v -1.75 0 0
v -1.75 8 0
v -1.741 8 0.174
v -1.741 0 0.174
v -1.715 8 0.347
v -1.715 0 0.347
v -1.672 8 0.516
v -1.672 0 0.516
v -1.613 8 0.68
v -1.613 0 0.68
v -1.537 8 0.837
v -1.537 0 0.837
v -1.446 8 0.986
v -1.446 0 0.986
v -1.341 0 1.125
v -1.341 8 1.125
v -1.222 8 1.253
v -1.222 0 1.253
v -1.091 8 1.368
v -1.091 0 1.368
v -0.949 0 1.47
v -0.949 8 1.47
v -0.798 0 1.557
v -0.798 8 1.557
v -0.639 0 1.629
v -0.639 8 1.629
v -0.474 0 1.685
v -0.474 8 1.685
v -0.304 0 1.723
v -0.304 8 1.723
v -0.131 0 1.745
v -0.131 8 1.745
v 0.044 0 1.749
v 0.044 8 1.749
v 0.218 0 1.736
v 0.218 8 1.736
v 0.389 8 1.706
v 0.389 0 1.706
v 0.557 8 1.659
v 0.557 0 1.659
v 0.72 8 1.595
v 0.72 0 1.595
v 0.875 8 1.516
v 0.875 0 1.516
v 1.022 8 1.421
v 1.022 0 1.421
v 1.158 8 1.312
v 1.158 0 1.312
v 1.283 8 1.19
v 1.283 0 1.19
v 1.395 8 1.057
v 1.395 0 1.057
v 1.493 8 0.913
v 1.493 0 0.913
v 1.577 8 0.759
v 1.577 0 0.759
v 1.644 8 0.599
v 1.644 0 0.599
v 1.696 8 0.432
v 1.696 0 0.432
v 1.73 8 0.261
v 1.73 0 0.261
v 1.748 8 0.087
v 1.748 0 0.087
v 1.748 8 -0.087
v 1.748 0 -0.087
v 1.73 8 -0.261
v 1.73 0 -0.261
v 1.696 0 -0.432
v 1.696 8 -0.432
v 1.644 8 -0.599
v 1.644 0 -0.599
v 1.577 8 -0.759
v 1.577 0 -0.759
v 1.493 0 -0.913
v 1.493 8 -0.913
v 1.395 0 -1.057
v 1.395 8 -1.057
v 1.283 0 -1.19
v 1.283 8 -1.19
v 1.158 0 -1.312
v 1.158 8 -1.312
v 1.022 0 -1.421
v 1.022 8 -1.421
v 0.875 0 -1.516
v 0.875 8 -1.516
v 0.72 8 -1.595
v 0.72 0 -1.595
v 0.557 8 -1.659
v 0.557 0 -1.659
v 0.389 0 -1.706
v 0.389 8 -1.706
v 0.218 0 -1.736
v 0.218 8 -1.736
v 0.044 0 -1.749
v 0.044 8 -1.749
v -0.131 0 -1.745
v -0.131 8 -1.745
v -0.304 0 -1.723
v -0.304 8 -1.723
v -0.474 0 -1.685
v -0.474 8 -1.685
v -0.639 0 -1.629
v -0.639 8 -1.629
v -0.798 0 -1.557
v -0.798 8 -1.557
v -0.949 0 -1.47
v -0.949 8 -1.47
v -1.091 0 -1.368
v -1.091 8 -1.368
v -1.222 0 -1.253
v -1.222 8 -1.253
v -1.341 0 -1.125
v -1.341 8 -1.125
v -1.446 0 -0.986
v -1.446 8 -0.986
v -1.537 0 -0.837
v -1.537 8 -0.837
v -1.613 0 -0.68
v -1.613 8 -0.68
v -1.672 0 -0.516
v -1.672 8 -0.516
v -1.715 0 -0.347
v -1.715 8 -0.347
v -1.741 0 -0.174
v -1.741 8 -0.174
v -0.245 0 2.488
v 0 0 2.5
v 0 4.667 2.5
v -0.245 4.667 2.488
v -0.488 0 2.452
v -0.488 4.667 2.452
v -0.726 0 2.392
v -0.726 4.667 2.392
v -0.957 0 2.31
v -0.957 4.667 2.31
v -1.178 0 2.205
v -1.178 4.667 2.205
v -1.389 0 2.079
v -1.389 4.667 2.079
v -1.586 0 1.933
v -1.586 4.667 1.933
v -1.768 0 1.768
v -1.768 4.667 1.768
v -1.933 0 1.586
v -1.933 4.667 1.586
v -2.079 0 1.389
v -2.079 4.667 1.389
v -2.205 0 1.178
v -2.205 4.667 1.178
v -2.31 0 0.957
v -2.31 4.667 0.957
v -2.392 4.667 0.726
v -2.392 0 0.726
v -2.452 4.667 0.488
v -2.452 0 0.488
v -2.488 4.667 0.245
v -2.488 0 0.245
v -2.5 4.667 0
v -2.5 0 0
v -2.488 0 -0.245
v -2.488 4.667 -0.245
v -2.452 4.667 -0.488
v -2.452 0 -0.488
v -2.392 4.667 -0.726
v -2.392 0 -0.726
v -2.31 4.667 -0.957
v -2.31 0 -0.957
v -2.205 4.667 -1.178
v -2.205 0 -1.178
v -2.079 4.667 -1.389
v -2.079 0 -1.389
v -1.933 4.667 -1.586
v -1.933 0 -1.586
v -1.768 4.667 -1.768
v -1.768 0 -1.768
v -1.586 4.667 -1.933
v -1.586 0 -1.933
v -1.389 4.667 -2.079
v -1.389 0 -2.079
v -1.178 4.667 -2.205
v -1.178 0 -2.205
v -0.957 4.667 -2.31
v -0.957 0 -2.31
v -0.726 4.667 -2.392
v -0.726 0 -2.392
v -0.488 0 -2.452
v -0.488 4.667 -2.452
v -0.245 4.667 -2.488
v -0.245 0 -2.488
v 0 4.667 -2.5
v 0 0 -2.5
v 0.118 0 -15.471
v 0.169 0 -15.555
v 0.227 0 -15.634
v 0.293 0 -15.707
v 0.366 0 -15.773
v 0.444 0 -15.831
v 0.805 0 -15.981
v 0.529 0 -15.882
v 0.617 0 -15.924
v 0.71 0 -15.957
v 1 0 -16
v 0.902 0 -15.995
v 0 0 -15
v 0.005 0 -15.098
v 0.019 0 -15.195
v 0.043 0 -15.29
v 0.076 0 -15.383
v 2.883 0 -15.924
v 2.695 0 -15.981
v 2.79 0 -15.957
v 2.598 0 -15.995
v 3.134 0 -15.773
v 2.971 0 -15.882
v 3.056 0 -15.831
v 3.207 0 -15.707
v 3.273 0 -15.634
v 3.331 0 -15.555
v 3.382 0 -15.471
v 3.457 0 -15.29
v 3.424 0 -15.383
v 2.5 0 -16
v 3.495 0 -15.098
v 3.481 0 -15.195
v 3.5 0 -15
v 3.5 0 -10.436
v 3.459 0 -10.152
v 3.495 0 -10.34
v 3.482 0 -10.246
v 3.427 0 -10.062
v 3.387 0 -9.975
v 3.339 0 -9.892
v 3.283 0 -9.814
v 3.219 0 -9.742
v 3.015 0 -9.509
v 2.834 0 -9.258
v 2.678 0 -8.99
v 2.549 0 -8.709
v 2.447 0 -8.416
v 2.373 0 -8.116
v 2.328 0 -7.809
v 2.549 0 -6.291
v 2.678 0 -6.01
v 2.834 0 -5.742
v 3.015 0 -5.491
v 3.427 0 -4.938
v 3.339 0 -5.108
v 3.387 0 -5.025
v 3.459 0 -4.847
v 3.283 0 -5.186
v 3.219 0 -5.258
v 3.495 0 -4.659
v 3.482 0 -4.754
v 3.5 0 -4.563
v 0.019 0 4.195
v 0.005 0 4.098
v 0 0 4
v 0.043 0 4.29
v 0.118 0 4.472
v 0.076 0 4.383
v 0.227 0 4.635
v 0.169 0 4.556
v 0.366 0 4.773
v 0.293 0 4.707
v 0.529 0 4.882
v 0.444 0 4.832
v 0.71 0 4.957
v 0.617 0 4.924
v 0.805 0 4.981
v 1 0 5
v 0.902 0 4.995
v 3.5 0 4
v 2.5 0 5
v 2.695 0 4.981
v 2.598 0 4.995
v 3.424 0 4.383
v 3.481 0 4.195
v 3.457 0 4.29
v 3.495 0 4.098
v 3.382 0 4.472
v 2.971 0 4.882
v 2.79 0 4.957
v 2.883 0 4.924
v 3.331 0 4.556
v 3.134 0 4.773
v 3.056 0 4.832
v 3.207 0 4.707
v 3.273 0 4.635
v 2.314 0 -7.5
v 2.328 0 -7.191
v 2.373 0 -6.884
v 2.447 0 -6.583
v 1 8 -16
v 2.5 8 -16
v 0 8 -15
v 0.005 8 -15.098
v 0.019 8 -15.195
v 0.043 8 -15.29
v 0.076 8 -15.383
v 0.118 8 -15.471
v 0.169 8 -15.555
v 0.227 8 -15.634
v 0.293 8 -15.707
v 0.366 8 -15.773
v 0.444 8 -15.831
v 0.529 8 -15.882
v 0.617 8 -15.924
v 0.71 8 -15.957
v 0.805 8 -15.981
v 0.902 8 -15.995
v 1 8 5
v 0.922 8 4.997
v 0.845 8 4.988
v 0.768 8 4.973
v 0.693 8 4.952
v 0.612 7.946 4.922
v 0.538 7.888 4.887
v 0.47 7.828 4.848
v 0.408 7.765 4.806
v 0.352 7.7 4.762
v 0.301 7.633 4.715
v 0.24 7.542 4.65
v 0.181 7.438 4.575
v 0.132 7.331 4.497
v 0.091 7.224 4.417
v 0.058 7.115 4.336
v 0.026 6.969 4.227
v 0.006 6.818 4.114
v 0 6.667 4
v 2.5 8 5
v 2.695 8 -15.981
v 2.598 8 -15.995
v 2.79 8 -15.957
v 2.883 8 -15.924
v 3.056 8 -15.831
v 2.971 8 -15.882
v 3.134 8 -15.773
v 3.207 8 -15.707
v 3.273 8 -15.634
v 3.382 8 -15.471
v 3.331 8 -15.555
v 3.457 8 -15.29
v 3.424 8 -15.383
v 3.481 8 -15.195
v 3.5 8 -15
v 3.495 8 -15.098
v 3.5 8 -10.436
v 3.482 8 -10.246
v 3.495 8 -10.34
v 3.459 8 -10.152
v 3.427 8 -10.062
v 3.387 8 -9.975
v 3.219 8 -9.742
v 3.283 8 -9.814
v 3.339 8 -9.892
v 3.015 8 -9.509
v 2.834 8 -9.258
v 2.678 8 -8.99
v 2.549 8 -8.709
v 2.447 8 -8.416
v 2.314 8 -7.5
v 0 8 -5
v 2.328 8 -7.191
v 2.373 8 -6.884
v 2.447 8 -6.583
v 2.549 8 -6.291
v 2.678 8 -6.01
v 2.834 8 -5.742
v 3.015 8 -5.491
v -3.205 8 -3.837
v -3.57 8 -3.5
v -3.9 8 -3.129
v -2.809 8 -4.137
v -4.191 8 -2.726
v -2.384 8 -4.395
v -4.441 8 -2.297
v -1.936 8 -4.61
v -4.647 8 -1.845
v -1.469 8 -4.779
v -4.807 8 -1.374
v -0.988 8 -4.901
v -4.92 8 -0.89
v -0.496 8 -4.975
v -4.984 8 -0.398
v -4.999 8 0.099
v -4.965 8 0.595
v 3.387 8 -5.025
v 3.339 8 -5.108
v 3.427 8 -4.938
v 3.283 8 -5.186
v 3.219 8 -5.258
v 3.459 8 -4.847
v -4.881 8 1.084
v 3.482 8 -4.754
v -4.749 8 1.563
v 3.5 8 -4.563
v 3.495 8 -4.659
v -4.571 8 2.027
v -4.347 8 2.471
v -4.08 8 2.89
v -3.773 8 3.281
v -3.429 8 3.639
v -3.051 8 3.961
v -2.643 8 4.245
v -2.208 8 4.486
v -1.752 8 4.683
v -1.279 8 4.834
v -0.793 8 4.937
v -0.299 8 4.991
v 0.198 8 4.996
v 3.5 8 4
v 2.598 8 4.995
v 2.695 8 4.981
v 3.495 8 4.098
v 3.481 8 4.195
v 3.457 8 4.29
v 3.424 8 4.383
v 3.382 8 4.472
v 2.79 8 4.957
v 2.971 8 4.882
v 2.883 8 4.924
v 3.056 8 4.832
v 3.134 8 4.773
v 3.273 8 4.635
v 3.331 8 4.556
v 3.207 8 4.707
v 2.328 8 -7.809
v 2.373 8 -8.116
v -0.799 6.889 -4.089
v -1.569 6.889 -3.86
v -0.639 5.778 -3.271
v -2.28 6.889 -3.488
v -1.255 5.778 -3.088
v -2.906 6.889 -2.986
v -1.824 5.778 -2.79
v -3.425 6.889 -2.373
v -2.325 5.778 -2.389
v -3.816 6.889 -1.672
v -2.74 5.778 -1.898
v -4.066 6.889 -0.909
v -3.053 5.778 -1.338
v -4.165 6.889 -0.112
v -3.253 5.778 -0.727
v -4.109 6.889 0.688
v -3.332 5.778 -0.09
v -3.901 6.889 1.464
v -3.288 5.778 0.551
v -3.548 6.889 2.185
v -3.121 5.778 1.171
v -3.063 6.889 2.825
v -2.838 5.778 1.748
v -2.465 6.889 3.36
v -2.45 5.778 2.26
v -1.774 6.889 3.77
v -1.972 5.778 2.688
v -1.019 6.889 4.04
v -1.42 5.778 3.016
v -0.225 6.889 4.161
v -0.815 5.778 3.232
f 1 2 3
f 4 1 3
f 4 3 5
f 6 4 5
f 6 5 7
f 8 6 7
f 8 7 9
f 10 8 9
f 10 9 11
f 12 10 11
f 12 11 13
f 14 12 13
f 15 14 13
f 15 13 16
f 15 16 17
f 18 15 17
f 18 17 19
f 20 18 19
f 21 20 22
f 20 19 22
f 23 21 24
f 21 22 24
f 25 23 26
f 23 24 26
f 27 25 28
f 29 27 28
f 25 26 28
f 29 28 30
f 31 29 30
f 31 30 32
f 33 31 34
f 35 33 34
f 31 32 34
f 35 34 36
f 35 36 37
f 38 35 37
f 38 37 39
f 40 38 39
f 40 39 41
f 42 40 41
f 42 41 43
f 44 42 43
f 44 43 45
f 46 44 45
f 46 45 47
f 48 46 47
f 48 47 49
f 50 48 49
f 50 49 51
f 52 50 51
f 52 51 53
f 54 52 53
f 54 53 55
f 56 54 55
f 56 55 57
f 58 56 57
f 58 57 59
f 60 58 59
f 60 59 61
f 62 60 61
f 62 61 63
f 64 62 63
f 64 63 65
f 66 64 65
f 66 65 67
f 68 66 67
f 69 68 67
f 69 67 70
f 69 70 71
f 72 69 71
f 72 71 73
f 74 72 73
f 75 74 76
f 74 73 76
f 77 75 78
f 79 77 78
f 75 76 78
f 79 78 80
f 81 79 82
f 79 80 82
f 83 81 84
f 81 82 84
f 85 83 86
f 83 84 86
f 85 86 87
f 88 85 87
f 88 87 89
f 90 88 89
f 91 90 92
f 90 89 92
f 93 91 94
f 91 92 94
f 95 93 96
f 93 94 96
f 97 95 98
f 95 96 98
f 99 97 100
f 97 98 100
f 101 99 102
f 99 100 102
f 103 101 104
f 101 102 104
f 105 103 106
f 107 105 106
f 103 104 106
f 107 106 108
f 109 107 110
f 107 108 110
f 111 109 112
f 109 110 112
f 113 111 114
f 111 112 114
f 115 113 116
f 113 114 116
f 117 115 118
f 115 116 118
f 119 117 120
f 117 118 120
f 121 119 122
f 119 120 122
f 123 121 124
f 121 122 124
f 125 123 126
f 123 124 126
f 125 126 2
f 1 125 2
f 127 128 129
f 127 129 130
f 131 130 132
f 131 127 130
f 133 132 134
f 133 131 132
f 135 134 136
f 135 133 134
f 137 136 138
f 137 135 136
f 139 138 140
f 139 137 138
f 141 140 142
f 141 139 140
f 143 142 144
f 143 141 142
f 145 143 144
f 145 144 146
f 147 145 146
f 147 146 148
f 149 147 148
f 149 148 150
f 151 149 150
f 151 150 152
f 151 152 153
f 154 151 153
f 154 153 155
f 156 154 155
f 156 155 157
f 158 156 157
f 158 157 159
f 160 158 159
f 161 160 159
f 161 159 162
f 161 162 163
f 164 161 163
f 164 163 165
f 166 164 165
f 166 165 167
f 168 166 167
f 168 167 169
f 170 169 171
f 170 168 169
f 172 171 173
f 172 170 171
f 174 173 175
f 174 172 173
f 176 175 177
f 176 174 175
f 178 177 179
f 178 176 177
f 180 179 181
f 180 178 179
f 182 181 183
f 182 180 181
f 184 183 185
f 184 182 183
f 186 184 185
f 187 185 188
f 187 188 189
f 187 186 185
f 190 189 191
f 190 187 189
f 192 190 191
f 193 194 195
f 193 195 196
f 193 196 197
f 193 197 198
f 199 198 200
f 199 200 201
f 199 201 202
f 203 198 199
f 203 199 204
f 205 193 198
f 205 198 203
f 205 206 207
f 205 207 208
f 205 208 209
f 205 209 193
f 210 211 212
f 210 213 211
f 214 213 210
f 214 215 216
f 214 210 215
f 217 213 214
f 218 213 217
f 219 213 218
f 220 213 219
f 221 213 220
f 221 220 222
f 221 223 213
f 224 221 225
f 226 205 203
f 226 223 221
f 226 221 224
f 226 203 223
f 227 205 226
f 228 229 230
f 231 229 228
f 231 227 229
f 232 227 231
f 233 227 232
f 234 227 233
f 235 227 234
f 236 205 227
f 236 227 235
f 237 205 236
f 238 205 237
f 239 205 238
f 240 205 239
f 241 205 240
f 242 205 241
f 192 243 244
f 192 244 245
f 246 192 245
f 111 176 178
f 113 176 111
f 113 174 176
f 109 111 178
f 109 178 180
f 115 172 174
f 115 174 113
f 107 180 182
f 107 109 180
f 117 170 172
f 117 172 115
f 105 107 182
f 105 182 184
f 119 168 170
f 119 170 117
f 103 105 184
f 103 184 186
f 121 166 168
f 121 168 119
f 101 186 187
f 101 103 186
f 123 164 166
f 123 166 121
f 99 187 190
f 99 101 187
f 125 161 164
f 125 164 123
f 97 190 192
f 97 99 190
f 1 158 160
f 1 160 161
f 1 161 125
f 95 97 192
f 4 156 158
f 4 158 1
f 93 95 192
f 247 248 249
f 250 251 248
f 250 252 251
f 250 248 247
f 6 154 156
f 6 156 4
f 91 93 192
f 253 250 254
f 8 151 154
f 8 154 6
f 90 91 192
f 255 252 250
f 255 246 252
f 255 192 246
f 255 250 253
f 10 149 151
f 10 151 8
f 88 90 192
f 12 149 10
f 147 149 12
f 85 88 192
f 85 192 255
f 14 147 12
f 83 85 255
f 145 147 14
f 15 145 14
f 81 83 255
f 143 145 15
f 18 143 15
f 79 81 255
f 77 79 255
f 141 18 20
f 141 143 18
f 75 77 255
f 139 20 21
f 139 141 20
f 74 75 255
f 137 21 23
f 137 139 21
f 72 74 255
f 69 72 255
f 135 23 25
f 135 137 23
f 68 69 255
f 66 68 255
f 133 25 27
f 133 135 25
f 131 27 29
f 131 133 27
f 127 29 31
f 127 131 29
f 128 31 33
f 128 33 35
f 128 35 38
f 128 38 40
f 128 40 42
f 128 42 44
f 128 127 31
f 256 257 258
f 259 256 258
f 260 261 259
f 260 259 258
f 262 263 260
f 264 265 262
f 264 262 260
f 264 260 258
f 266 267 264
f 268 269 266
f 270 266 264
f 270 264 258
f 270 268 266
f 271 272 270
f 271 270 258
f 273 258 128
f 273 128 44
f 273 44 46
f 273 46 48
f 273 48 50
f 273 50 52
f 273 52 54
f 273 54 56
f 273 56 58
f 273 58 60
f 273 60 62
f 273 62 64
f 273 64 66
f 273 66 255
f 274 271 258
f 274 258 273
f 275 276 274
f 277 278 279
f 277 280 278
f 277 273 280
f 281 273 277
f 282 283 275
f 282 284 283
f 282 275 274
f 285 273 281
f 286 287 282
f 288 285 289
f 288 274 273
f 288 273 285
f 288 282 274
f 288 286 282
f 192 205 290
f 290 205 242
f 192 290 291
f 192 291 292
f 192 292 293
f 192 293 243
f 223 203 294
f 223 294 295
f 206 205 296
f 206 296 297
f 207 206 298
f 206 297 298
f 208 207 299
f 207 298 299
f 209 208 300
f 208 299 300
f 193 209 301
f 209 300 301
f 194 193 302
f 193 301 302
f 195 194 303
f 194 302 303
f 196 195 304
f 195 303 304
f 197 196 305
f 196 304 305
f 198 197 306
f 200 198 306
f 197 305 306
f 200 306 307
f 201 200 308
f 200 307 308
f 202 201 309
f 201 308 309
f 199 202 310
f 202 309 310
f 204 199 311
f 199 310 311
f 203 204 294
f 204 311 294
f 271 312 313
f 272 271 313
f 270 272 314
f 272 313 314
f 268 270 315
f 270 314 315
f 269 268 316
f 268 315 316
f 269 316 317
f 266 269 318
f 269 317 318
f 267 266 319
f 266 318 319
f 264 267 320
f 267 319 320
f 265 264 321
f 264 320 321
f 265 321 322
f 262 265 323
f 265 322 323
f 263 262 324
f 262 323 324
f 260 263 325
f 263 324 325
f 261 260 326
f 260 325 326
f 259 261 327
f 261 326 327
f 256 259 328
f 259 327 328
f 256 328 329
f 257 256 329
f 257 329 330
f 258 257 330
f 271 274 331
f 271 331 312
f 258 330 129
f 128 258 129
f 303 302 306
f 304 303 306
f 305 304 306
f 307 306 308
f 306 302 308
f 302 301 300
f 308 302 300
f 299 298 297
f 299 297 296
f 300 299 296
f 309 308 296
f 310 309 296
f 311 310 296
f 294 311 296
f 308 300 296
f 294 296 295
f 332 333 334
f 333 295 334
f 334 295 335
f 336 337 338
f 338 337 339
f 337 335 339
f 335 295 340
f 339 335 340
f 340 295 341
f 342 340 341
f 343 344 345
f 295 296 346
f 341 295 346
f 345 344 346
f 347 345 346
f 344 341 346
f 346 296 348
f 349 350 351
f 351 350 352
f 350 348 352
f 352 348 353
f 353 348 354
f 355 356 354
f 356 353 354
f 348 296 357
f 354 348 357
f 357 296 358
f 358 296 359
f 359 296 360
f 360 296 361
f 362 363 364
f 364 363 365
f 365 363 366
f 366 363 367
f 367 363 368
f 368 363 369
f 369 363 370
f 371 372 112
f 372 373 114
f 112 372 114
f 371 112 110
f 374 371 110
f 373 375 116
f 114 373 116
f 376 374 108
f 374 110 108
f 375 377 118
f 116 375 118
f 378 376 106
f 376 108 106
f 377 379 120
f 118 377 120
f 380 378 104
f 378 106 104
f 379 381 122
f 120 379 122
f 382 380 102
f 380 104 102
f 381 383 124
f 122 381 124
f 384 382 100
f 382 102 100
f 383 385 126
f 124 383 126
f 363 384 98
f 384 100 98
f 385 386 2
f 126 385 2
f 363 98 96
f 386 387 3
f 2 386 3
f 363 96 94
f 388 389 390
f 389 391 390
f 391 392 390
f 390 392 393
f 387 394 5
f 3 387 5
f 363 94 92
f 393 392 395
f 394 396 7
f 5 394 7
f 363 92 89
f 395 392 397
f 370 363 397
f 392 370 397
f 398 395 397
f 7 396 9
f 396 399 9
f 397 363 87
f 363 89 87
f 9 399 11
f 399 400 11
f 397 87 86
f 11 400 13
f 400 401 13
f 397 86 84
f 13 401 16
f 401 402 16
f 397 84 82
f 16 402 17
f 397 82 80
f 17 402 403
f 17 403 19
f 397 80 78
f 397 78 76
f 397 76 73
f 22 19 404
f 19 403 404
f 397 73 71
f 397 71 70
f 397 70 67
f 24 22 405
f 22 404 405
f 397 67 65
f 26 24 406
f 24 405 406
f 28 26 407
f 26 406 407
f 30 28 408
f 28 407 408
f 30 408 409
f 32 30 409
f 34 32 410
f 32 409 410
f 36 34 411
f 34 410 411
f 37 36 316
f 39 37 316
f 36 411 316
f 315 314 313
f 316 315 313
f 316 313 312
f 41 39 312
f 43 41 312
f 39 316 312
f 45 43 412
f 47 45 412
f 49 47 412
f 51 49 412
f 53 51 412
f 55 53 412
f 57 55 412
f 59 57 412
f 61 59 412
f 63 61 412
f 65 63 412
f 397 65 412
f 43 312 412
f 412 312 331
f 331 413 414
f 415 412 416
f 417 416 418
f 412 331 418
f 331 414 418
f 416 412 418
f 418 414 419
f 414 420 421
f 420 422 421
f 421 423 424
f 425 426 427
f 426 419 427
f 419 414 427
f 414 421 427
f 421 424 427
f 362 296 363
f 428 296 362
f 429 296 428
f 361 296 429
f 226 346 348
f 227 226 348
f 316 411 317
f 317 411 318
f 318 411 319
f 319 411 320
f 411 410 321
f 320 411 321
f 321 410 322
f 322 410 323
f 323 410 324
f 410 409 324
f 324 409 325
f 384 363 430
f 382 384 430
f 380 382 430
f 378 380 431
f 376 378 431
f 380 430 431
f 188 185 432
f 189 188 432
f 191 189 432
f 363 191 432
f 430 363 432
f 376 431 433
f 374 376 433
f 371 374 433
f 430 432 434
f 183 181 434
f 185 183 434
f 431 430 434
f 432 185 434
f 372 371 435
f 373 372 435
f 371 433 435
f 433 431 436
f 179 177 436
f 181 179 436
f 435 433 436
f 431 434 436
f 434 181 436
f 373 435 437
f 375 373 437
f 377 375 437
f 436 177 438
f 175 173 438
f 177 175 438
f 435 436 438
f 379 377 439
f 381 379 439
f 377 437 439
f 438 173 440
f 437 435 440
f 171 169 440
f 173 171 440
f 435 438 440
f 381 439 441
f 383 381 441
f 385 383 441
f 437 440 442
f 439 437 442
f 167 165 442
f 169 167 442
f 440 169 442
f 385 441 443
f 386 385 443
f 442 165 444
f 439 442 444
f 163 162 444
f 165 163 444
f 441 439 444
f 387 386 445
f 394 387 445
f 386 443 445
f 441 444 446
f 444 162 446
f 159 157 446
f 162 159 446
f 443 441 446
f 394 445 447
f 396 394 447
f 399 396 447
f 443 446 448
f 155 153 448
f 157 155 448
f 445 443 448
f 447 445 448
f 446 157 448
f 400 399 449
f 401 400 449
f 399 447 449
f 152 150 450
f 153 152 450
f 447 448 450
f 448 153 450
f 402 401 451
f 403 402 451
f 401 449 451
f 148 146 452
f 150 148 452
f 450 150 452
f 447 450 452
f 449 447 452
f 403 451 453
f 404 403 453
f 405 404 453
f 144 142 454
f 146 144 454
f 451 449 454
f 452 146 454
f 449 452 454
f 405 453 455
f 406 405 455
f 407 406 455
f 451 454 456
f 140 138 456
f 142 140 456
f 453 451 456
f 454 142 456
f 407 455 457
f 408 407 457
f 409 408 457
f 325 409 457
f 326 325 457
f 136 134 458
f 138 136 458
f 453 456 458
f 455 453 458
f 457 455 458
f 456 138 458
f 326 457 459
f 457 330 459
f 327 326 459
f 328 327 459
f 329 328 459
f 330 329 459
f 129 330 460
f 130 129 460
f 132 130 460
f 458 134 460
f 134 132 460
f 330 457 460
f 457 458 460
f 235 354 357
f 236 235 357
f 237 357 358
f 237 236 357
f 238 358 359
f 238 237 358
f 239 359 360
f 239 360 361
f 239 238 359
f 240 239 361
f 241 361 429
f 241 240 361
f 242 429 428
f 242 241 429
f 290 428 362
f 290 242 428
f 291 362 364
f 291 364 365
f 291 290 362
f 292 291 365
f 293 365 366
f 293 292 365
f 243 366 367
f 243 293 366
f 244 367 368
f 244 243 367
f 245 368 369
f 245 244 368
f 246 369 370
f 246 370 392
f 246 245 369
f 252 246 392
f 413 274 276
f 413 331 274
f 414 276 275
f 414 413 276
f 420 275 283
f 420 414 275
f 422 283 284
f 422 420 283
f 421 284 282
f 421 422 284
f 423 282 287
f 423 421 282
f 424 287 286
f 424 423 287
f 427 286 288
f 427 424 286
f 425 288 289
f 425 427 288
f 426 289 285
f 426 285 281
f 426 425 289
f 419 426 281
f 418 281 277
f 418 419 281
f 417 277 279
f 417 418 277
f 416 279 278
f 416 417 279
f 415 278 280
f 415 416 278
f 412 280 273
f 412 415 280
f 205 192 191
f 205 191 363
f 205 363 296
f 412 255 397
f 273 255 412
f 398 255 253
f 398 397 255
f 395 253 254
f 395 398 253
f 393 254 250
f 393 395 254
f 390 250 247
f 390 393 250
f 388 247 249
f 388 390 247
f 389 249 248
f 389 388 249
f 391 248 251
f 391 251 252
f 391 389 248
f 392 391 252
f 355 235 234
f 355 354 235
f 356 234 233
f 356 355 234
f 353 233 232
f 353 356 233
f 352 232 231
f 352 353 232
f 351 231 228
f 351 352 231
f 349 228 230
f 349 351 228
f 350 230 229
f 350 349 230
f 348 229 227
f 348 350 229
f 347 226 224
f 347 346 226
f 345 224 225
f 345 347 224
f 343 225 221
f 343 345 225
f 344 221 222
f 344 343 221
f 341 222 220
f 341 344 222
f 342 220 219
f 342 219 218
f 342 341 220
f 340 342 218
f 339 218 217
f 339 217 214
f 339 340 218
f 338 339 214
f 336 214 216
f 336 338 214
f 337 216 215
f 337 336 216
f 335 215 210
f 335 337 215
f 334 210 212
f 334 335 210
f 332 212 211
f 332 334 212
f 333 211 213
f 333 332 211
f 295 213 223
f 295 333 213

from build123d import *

# Parameters (mm, degrees)
F1_ANGLE_BACK = 90
F1_ANGLE      = 180
F4_DEPTH      = 8
F5_R          = 1.75
F6_DEPTH      = 25
F7_R          = 1
F8_R          = 1


with BuildPart() as f1:
    # F0 (on Top) → F1 (revolve)
    with BuildSketch(Plane.XY, mode=Mode.PRIVATE) as f1_sk:
        Polygon((0, 0), (0, 8), (-5, 8), (-1, 2.6666666667), (-1, 0), align=None)
    revolve(f1_sk.sketch.rotate(Axis((0, 4, 0), (0, 1, 0)), -F1_ANGLE_BACK), axis=Axis((0, 4, 0), (0, 1, 0)), revolution_arc=F1_ANGLE)

    # F3 (on Front) → F4 (join)
    with BuildSketch(Plane.XZ):
        with BuildLine():
            Line((3.5, 5.0001256168), (0, 5.0001256168))
            Line((0, 5.0001256168), (0, 2.5))
            ThreePointArc((0, 2.5), (-2.5, 0), (0, -2.5))
            Line((0, -2.5), (0, -15.9998743832))
            Line((0, -15.9998743832), (3.5, -15.9998743832))
            Line((3.5, -15.9998743832), (3.5, -9.9998743832))
            ThreePointArc((3.5, -9.9998743832), (2.3136093185, -7.4998743832), (3.5, -4.9998743832))
            Line((3.5, -4.9998743832), (3.5, 5.0001256168))
        make_face()
    extrude(amount=-F4_DEPTH)

    # F5 (on face) → F6 (cut)
    with BuildSketch(Plane(origin=(0, 8, 0), x_dir=(-1, 0, 0), z_dir=(0, 1, 0))):
        Circle(F5_R)
    extrude(amount=-F6_DEPTH, mode=Mode.SUBTRACT)

    # F7
    f7_edges = [f1.edges().sort_by_distance(p)[0] for p in [
        (3.5, 4, 5.000126),
        (0, 4, -15.999874),
        (3.5, 4, -15.999874),
        (3.5, 4, -9.999874),
        (3.5, 4, -4.999874),
    ]]
    fillet(f7_edges, radius=F7_R)

    # F8
    f8_edges = [f1.edges().sort_by_distance(p)[0] for p in [
        (0, 4, 5.000126),
    ]]
    fillet(f8_edges, radius=F8_R)


solid = f1.part
